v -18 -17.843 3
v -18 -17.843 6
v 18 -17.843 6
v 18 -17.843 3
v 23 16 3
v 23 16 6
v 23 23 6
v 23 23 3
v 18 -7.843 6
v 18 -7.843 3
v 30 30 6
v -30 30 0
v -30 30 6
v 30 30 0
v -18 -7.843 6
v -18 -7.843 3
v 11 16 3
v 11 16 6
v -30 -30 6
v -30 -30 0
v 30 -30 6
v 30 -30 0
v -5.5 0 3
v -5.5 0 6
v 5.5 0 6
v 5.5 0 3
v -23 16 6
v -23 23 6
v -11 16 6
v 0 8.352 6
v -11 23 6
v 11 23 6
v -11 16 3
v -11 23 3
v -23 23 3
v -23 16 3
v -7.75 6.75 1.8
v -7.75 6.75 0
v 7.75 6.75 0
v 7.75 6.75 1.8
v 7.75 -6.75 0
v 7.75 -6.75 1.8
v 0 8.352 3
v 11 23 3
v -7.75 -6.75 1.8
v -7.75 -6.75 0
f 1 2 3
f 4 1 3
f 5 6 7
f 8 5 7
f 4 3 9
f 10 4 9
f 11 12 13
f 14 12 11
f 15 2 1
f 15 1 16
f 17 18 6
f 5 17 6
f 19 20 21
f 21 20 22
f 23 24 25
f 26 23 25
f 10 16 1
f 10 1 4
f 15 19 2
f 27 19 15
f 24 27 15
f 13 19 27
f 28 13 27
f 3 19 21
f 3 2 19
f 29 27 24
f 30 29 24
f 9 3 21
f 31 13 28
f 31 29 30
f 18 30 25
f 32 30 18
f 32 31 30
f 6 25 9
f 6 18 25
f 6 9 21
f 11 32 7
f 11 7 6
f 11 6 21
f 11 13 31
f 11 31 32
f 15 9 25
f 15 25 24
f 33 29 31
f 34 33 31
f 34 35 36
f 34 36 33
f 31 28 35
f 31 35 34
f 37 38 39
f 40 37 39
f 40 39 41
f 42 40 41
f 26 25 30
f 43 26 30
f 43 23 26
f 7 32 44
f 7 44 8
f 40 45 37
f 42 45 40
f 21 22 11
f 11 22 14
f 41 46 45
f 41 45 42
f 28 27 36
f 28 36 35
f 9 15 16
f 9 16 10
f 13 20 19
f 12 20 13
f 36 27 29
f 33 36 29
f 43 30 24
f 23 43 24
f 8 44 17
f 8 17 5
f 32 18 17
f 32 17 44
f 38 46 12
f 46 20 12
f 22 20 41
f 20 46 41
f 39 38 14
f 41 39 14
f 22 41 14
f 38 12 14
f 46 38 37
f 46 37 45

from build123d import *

# Parameters (mm, degrees)
F0_W     = 60
F0_H     = 60
F1_DEPTH = 6
F2_W     = 12
F2_H     = 7
F2_W_2   = 36
F2_H_2   = 10
F3_DEPTH = 3
F4_W     = 15.5
F4_H     = 13.5
F5_DEPTH = 1.8


with BuildPart() as f1:
    # F0 (on Top) → F1 (new body)
    with BuildSketch(Plane.XY):
        Rectangle(F0_W, F0_H)
    extrude(amount=F1_DEPTH)

    # F2 (on face) → F3 (cut)
    with BuildSketch(Plane.XY.offset(6)):
        with Locations((-17, 19.5)):
            Rectangle(F2_W, F2_H)
        with Locations((17, 19.5)):
            Rectangle(F2_W, F2_H)
        with Locations((0, -12.842694)):
            Rectangle(F2_W_2, F2_H_2)
        Polygon((5.5, 0), (0, 8.351647), (-5.5, 0), align=None)
    extrude(amount=-F3_DEPTH, mode=Mode.SUBTRACT)

    # F4 (on face) → F5 (cut)
    with BuildSketch(Plane(origin=(0, 0, 0), x_dir=(1, 0, 0), z_dir=(0, 0, -1))):
        Rectangle(F4_W, F4_H)
    extrude(amount=-F5_DEPTH, mode=Mode.SUBTRACT)


solid = f1.part
